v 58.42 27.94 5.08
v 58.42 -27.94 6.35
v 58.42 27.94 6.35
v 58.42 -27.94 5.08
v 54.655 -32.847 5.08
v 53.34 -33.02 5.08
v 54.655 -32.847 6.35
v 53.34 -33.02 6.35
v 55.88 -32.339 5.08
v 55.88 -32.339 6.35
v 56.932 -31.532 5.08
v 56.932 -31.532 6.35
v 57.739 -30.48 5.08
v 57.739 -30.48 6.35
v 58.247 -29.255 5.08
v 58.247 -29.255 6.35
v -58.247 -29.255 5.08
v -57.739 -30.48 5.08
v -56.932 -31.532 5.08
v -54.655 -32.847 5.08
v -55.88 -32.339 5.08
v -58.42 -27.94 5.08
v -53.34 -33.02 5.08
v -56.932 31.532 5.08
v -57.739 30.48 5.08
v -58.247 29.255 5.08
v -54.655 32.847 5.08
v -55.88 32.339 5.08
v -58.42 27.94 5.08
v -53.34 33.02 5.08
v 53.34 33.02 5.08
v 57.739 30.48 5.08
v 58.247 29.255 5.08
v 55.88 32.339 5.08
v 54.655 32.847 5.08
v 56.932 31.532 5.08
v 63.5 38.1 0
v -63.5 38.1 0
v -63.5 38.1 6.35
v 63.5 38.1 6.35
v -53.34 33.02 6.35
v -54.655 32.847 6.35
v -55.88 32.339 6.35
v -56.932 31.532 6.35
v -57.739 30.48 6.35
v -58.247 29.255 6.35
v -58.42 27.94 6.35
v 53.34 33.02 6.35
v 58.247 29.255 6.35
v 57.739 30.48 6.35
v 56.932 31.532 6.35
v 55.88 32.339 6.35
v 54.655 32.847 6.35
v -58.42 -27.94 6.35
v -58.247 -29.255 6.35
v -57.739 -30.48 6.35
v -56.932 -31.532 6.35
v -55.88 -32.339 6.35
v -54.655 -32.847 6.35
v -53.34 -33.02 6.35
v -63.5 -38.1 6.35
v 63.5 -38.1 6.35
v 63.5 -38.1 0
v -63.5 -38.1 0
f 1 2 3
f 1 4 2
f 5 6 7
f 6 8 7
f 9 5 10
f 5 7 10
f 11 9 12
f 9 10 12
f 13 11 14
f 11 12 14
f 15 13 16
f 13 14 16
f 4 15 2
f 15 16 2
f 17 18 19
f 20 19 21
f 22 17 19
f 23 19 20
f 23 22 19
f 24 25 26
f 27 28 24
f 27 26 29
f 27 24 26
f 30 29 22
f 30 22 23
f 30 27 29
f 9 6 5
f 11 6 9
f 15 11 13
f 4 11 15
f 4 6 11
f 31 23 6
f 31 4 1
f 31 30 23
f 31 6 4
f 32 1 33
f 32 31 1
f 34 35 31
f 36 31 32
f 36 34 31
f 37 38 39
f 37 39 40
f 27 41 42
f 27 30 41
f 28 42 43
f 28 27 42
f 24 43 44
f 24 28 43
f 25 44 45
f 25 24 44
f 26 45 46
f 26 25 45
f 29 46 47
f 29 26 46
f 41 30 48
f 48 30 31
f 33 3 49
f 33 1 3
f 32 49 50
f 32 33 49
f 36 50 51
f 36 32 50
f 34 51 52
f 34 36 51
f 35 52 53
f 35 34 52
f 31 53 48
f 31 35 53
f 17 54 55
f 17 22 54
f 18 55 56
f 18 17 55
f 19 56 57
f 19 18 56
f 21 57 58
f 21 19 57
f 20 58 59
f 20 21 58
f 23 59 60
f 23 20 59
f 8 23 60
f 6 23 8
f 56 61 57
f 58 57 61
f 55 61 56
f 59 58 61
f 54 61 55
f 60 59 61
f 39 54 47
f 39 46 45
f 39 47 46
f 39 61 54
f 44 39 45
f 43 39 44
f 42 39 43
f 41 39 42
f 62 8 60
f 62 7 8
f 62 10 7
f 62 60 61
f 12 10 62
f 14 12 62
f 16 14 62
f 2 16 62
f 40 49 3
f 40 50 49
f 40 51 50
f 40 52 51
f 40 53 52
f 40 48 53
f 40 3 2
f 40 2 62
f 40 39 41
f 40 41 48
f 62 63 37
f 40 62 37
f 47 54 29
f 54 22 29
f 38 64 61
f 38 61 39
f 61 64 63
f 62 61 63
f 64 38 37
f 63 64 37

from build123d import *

# Parameters (mm, degrees)
F0_W     = 127
F0_H     = 76.2
F1_DEPTH = 6.35
F2_T     = -5.08
F3_R     = 5.08
F4_R     = 5.08
F5_R     = 5.08
F6_R     = 5.08


with BuildPart() as f1:
    # F0 (on Top) → F1 (new body)
    with BuildSketch(Plane.XY):
        Rectangle(F0_W, F0_H)
    extrude(amount=F1_DEPTH)

    # F2
    f2_openings = [f1.faces().sort_by_distance(p)[0] for p in [
        (0, 0, 6.35),
    ]]
    offset(amount=F2_T, openings=f2_openings)

    # F3
    f3_edges = [f1.edges().sort_by_distance(p)[0] for p in [
        (58.42, 33.02, 5.715),
    ]]
    fillet(f3_edges, radius=F3_R)

    # F4
    f4_edges = [f1.edges().sort_by_distance(p)[0] for p in [
        (-58.42, 33.02, 5.715),
    ]]
    fillet(f4_edges, radius=F4_R)

    # F5
    f5_edges = [f1.edges().sort_by_distance(p)[0] for p in [
        (-58.42, -33.02, 5.715),
    ]]
    fillet(f5_edges, radius=F5_R)

    # F6
    f6_edges = [f1.edges().sort_by_distance(p)[0] for p in [
        (58.42, -33.02, 5.715),
    ]]
    fillet(f6_edges, radius=F6_R)


solid = f1.part
